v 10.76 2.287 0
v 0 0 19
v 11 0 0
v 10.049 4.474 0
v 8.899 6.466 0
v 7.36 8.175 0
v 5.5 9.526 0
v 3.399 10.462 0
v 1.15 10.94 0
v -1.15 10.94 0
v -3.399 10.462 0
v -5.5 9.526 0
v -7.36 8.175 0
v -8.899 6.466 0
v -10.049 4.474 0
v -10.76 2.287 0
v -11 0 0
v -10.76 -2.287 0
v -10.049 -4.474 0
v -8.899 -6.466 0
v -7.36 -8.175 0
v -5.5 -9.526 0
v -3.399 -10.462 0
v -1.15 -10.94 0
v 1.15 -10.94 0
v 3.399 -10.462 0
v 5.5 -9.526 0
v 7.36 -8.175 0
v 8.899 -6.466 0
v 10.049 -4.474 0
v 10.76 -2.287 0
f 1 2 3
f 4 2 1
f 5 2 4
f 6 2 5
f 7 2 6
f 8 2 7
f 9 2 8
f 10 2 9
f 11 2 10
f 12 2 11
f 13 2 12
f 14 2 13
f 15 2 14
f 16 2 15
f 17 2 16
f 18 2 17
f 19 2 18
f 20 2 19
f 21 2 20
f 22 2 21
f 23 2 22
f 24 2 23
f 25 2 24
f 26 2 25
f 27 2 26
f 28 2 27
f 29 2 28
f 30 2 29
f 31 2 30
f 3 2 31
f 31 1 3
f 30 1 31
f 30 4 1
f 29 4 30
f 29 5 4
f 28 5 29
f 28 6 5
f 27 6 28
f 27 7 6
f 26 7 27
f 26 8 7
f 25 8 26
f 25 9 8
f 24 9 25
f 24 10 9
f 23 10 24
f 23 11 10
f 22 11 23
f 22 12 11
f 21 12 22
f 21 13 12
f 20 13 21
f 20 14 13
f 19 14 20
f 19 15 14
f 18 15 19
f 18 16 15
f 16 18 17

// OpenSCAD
// Generated by SolidPython 1.0.1 on 2020-07-29 00:46:43


cylinder(h = 19, r1 = 11, r2 = 0);
/***********************************************
*********      SolidPython code:      **********
************************************************
 
# import packages: SolidPython
from solid import *
from solid.utils import *
from itertools import chain, combinations, permutations


class Resize:

    def __init__(self, scad_file):
        self.scad_file = scad_file
        #self.scad_file = import_scad(scad_file)
        # cone/cylinder param:
        self.r1 = 0
        self.r2 = 0
        self.h = 0
        # rectangular prism param:
        self.w = 0
        self.l = 0
        # ellipse param:
        self.r = 0

    # import OpenScad code (file name corresponds to shape)


    # classify shape + parameters
    def assign(self, param1, param2, param3):
        if self.scad_file == 'cone.scad':
            self.r1 = param1
            self.r2 = param2
            self.h = param3
        elif self.scad_file == 'cylinder.scad':
            self.r1 = param1
            self.r2 = param2
            self.h = param3
        elif self.scad_file == 'rectangularPrism.scad':
            self.h = param1
            self.l = param2
            self.w = param3
        else:
            self.r = param1
            self.h = param2

    # resize parameters
    def iterate(self):
        x = range(3, 20, 2)
        i = 1
        if self.scad_file == 'cone.scad':
            tempList = list(permutations(x, 2))
            for temp in tempList:
                param1 = temp[0]
                param2 = temp[1]
                filepath = 'produced_scad_files/' + 'cone' + str(param1) + '_' + str(param2) + '_' + '.scad'
                scad_render_to_file(cylinder(h=param1, r1=param2, r2=0), filepath)

        elif self.scad_file == 'cylinder.scad':
            tempList = list(permutations(x, 3))
            for temp in tempList:
                param1 = temp[0]
                param2 = temp[1]
                filepath = 'produced_scad_files/' + 'cylinder' + str(param1) + '_' + str(param2) + '_' + '.scad'
                scad_render_to_file(cylinder(h=param1, r1=param2, r2=param2), filepath)

        elif self.scad_file == 'rectangularPrism.scad':
            tempList = list(permutations(x, 3))
            for temp in tempList:
                param1 = temp[0]
                param2 = temp[1]
                param3 = temp[2]
                filepath = 'produced_scad_files/' + 'rectangularPrism' + str(param1) + '_' + str(param2) + '_' + str(
                    param3) + '.scad'
                scad_render_to_file(cube(size=(param1, param2, param3)), filepath)

        elif self.scad_file == 'ellipse.scad':
            tempList = list(permutations(x, 4))
            for temp in tempList:
                param1 = temp[0]
                param2 = temp[1]
                param3 = temp[2]
                param4 = temp[3]
                filepath = 'produced_scad_files/' + 'ellipse' + str(param1) + '_' + str(param2) + '_' + str(param3) + '_' + str(param4) + '.scad'
                scad_render_to_file(scale([param1, param2, param3])(sphere(r=param4)), filepath)

    def render_to_scadfile(self):
        scad_render_to_file(scad, 'example.scad') 
 
************************************************/
